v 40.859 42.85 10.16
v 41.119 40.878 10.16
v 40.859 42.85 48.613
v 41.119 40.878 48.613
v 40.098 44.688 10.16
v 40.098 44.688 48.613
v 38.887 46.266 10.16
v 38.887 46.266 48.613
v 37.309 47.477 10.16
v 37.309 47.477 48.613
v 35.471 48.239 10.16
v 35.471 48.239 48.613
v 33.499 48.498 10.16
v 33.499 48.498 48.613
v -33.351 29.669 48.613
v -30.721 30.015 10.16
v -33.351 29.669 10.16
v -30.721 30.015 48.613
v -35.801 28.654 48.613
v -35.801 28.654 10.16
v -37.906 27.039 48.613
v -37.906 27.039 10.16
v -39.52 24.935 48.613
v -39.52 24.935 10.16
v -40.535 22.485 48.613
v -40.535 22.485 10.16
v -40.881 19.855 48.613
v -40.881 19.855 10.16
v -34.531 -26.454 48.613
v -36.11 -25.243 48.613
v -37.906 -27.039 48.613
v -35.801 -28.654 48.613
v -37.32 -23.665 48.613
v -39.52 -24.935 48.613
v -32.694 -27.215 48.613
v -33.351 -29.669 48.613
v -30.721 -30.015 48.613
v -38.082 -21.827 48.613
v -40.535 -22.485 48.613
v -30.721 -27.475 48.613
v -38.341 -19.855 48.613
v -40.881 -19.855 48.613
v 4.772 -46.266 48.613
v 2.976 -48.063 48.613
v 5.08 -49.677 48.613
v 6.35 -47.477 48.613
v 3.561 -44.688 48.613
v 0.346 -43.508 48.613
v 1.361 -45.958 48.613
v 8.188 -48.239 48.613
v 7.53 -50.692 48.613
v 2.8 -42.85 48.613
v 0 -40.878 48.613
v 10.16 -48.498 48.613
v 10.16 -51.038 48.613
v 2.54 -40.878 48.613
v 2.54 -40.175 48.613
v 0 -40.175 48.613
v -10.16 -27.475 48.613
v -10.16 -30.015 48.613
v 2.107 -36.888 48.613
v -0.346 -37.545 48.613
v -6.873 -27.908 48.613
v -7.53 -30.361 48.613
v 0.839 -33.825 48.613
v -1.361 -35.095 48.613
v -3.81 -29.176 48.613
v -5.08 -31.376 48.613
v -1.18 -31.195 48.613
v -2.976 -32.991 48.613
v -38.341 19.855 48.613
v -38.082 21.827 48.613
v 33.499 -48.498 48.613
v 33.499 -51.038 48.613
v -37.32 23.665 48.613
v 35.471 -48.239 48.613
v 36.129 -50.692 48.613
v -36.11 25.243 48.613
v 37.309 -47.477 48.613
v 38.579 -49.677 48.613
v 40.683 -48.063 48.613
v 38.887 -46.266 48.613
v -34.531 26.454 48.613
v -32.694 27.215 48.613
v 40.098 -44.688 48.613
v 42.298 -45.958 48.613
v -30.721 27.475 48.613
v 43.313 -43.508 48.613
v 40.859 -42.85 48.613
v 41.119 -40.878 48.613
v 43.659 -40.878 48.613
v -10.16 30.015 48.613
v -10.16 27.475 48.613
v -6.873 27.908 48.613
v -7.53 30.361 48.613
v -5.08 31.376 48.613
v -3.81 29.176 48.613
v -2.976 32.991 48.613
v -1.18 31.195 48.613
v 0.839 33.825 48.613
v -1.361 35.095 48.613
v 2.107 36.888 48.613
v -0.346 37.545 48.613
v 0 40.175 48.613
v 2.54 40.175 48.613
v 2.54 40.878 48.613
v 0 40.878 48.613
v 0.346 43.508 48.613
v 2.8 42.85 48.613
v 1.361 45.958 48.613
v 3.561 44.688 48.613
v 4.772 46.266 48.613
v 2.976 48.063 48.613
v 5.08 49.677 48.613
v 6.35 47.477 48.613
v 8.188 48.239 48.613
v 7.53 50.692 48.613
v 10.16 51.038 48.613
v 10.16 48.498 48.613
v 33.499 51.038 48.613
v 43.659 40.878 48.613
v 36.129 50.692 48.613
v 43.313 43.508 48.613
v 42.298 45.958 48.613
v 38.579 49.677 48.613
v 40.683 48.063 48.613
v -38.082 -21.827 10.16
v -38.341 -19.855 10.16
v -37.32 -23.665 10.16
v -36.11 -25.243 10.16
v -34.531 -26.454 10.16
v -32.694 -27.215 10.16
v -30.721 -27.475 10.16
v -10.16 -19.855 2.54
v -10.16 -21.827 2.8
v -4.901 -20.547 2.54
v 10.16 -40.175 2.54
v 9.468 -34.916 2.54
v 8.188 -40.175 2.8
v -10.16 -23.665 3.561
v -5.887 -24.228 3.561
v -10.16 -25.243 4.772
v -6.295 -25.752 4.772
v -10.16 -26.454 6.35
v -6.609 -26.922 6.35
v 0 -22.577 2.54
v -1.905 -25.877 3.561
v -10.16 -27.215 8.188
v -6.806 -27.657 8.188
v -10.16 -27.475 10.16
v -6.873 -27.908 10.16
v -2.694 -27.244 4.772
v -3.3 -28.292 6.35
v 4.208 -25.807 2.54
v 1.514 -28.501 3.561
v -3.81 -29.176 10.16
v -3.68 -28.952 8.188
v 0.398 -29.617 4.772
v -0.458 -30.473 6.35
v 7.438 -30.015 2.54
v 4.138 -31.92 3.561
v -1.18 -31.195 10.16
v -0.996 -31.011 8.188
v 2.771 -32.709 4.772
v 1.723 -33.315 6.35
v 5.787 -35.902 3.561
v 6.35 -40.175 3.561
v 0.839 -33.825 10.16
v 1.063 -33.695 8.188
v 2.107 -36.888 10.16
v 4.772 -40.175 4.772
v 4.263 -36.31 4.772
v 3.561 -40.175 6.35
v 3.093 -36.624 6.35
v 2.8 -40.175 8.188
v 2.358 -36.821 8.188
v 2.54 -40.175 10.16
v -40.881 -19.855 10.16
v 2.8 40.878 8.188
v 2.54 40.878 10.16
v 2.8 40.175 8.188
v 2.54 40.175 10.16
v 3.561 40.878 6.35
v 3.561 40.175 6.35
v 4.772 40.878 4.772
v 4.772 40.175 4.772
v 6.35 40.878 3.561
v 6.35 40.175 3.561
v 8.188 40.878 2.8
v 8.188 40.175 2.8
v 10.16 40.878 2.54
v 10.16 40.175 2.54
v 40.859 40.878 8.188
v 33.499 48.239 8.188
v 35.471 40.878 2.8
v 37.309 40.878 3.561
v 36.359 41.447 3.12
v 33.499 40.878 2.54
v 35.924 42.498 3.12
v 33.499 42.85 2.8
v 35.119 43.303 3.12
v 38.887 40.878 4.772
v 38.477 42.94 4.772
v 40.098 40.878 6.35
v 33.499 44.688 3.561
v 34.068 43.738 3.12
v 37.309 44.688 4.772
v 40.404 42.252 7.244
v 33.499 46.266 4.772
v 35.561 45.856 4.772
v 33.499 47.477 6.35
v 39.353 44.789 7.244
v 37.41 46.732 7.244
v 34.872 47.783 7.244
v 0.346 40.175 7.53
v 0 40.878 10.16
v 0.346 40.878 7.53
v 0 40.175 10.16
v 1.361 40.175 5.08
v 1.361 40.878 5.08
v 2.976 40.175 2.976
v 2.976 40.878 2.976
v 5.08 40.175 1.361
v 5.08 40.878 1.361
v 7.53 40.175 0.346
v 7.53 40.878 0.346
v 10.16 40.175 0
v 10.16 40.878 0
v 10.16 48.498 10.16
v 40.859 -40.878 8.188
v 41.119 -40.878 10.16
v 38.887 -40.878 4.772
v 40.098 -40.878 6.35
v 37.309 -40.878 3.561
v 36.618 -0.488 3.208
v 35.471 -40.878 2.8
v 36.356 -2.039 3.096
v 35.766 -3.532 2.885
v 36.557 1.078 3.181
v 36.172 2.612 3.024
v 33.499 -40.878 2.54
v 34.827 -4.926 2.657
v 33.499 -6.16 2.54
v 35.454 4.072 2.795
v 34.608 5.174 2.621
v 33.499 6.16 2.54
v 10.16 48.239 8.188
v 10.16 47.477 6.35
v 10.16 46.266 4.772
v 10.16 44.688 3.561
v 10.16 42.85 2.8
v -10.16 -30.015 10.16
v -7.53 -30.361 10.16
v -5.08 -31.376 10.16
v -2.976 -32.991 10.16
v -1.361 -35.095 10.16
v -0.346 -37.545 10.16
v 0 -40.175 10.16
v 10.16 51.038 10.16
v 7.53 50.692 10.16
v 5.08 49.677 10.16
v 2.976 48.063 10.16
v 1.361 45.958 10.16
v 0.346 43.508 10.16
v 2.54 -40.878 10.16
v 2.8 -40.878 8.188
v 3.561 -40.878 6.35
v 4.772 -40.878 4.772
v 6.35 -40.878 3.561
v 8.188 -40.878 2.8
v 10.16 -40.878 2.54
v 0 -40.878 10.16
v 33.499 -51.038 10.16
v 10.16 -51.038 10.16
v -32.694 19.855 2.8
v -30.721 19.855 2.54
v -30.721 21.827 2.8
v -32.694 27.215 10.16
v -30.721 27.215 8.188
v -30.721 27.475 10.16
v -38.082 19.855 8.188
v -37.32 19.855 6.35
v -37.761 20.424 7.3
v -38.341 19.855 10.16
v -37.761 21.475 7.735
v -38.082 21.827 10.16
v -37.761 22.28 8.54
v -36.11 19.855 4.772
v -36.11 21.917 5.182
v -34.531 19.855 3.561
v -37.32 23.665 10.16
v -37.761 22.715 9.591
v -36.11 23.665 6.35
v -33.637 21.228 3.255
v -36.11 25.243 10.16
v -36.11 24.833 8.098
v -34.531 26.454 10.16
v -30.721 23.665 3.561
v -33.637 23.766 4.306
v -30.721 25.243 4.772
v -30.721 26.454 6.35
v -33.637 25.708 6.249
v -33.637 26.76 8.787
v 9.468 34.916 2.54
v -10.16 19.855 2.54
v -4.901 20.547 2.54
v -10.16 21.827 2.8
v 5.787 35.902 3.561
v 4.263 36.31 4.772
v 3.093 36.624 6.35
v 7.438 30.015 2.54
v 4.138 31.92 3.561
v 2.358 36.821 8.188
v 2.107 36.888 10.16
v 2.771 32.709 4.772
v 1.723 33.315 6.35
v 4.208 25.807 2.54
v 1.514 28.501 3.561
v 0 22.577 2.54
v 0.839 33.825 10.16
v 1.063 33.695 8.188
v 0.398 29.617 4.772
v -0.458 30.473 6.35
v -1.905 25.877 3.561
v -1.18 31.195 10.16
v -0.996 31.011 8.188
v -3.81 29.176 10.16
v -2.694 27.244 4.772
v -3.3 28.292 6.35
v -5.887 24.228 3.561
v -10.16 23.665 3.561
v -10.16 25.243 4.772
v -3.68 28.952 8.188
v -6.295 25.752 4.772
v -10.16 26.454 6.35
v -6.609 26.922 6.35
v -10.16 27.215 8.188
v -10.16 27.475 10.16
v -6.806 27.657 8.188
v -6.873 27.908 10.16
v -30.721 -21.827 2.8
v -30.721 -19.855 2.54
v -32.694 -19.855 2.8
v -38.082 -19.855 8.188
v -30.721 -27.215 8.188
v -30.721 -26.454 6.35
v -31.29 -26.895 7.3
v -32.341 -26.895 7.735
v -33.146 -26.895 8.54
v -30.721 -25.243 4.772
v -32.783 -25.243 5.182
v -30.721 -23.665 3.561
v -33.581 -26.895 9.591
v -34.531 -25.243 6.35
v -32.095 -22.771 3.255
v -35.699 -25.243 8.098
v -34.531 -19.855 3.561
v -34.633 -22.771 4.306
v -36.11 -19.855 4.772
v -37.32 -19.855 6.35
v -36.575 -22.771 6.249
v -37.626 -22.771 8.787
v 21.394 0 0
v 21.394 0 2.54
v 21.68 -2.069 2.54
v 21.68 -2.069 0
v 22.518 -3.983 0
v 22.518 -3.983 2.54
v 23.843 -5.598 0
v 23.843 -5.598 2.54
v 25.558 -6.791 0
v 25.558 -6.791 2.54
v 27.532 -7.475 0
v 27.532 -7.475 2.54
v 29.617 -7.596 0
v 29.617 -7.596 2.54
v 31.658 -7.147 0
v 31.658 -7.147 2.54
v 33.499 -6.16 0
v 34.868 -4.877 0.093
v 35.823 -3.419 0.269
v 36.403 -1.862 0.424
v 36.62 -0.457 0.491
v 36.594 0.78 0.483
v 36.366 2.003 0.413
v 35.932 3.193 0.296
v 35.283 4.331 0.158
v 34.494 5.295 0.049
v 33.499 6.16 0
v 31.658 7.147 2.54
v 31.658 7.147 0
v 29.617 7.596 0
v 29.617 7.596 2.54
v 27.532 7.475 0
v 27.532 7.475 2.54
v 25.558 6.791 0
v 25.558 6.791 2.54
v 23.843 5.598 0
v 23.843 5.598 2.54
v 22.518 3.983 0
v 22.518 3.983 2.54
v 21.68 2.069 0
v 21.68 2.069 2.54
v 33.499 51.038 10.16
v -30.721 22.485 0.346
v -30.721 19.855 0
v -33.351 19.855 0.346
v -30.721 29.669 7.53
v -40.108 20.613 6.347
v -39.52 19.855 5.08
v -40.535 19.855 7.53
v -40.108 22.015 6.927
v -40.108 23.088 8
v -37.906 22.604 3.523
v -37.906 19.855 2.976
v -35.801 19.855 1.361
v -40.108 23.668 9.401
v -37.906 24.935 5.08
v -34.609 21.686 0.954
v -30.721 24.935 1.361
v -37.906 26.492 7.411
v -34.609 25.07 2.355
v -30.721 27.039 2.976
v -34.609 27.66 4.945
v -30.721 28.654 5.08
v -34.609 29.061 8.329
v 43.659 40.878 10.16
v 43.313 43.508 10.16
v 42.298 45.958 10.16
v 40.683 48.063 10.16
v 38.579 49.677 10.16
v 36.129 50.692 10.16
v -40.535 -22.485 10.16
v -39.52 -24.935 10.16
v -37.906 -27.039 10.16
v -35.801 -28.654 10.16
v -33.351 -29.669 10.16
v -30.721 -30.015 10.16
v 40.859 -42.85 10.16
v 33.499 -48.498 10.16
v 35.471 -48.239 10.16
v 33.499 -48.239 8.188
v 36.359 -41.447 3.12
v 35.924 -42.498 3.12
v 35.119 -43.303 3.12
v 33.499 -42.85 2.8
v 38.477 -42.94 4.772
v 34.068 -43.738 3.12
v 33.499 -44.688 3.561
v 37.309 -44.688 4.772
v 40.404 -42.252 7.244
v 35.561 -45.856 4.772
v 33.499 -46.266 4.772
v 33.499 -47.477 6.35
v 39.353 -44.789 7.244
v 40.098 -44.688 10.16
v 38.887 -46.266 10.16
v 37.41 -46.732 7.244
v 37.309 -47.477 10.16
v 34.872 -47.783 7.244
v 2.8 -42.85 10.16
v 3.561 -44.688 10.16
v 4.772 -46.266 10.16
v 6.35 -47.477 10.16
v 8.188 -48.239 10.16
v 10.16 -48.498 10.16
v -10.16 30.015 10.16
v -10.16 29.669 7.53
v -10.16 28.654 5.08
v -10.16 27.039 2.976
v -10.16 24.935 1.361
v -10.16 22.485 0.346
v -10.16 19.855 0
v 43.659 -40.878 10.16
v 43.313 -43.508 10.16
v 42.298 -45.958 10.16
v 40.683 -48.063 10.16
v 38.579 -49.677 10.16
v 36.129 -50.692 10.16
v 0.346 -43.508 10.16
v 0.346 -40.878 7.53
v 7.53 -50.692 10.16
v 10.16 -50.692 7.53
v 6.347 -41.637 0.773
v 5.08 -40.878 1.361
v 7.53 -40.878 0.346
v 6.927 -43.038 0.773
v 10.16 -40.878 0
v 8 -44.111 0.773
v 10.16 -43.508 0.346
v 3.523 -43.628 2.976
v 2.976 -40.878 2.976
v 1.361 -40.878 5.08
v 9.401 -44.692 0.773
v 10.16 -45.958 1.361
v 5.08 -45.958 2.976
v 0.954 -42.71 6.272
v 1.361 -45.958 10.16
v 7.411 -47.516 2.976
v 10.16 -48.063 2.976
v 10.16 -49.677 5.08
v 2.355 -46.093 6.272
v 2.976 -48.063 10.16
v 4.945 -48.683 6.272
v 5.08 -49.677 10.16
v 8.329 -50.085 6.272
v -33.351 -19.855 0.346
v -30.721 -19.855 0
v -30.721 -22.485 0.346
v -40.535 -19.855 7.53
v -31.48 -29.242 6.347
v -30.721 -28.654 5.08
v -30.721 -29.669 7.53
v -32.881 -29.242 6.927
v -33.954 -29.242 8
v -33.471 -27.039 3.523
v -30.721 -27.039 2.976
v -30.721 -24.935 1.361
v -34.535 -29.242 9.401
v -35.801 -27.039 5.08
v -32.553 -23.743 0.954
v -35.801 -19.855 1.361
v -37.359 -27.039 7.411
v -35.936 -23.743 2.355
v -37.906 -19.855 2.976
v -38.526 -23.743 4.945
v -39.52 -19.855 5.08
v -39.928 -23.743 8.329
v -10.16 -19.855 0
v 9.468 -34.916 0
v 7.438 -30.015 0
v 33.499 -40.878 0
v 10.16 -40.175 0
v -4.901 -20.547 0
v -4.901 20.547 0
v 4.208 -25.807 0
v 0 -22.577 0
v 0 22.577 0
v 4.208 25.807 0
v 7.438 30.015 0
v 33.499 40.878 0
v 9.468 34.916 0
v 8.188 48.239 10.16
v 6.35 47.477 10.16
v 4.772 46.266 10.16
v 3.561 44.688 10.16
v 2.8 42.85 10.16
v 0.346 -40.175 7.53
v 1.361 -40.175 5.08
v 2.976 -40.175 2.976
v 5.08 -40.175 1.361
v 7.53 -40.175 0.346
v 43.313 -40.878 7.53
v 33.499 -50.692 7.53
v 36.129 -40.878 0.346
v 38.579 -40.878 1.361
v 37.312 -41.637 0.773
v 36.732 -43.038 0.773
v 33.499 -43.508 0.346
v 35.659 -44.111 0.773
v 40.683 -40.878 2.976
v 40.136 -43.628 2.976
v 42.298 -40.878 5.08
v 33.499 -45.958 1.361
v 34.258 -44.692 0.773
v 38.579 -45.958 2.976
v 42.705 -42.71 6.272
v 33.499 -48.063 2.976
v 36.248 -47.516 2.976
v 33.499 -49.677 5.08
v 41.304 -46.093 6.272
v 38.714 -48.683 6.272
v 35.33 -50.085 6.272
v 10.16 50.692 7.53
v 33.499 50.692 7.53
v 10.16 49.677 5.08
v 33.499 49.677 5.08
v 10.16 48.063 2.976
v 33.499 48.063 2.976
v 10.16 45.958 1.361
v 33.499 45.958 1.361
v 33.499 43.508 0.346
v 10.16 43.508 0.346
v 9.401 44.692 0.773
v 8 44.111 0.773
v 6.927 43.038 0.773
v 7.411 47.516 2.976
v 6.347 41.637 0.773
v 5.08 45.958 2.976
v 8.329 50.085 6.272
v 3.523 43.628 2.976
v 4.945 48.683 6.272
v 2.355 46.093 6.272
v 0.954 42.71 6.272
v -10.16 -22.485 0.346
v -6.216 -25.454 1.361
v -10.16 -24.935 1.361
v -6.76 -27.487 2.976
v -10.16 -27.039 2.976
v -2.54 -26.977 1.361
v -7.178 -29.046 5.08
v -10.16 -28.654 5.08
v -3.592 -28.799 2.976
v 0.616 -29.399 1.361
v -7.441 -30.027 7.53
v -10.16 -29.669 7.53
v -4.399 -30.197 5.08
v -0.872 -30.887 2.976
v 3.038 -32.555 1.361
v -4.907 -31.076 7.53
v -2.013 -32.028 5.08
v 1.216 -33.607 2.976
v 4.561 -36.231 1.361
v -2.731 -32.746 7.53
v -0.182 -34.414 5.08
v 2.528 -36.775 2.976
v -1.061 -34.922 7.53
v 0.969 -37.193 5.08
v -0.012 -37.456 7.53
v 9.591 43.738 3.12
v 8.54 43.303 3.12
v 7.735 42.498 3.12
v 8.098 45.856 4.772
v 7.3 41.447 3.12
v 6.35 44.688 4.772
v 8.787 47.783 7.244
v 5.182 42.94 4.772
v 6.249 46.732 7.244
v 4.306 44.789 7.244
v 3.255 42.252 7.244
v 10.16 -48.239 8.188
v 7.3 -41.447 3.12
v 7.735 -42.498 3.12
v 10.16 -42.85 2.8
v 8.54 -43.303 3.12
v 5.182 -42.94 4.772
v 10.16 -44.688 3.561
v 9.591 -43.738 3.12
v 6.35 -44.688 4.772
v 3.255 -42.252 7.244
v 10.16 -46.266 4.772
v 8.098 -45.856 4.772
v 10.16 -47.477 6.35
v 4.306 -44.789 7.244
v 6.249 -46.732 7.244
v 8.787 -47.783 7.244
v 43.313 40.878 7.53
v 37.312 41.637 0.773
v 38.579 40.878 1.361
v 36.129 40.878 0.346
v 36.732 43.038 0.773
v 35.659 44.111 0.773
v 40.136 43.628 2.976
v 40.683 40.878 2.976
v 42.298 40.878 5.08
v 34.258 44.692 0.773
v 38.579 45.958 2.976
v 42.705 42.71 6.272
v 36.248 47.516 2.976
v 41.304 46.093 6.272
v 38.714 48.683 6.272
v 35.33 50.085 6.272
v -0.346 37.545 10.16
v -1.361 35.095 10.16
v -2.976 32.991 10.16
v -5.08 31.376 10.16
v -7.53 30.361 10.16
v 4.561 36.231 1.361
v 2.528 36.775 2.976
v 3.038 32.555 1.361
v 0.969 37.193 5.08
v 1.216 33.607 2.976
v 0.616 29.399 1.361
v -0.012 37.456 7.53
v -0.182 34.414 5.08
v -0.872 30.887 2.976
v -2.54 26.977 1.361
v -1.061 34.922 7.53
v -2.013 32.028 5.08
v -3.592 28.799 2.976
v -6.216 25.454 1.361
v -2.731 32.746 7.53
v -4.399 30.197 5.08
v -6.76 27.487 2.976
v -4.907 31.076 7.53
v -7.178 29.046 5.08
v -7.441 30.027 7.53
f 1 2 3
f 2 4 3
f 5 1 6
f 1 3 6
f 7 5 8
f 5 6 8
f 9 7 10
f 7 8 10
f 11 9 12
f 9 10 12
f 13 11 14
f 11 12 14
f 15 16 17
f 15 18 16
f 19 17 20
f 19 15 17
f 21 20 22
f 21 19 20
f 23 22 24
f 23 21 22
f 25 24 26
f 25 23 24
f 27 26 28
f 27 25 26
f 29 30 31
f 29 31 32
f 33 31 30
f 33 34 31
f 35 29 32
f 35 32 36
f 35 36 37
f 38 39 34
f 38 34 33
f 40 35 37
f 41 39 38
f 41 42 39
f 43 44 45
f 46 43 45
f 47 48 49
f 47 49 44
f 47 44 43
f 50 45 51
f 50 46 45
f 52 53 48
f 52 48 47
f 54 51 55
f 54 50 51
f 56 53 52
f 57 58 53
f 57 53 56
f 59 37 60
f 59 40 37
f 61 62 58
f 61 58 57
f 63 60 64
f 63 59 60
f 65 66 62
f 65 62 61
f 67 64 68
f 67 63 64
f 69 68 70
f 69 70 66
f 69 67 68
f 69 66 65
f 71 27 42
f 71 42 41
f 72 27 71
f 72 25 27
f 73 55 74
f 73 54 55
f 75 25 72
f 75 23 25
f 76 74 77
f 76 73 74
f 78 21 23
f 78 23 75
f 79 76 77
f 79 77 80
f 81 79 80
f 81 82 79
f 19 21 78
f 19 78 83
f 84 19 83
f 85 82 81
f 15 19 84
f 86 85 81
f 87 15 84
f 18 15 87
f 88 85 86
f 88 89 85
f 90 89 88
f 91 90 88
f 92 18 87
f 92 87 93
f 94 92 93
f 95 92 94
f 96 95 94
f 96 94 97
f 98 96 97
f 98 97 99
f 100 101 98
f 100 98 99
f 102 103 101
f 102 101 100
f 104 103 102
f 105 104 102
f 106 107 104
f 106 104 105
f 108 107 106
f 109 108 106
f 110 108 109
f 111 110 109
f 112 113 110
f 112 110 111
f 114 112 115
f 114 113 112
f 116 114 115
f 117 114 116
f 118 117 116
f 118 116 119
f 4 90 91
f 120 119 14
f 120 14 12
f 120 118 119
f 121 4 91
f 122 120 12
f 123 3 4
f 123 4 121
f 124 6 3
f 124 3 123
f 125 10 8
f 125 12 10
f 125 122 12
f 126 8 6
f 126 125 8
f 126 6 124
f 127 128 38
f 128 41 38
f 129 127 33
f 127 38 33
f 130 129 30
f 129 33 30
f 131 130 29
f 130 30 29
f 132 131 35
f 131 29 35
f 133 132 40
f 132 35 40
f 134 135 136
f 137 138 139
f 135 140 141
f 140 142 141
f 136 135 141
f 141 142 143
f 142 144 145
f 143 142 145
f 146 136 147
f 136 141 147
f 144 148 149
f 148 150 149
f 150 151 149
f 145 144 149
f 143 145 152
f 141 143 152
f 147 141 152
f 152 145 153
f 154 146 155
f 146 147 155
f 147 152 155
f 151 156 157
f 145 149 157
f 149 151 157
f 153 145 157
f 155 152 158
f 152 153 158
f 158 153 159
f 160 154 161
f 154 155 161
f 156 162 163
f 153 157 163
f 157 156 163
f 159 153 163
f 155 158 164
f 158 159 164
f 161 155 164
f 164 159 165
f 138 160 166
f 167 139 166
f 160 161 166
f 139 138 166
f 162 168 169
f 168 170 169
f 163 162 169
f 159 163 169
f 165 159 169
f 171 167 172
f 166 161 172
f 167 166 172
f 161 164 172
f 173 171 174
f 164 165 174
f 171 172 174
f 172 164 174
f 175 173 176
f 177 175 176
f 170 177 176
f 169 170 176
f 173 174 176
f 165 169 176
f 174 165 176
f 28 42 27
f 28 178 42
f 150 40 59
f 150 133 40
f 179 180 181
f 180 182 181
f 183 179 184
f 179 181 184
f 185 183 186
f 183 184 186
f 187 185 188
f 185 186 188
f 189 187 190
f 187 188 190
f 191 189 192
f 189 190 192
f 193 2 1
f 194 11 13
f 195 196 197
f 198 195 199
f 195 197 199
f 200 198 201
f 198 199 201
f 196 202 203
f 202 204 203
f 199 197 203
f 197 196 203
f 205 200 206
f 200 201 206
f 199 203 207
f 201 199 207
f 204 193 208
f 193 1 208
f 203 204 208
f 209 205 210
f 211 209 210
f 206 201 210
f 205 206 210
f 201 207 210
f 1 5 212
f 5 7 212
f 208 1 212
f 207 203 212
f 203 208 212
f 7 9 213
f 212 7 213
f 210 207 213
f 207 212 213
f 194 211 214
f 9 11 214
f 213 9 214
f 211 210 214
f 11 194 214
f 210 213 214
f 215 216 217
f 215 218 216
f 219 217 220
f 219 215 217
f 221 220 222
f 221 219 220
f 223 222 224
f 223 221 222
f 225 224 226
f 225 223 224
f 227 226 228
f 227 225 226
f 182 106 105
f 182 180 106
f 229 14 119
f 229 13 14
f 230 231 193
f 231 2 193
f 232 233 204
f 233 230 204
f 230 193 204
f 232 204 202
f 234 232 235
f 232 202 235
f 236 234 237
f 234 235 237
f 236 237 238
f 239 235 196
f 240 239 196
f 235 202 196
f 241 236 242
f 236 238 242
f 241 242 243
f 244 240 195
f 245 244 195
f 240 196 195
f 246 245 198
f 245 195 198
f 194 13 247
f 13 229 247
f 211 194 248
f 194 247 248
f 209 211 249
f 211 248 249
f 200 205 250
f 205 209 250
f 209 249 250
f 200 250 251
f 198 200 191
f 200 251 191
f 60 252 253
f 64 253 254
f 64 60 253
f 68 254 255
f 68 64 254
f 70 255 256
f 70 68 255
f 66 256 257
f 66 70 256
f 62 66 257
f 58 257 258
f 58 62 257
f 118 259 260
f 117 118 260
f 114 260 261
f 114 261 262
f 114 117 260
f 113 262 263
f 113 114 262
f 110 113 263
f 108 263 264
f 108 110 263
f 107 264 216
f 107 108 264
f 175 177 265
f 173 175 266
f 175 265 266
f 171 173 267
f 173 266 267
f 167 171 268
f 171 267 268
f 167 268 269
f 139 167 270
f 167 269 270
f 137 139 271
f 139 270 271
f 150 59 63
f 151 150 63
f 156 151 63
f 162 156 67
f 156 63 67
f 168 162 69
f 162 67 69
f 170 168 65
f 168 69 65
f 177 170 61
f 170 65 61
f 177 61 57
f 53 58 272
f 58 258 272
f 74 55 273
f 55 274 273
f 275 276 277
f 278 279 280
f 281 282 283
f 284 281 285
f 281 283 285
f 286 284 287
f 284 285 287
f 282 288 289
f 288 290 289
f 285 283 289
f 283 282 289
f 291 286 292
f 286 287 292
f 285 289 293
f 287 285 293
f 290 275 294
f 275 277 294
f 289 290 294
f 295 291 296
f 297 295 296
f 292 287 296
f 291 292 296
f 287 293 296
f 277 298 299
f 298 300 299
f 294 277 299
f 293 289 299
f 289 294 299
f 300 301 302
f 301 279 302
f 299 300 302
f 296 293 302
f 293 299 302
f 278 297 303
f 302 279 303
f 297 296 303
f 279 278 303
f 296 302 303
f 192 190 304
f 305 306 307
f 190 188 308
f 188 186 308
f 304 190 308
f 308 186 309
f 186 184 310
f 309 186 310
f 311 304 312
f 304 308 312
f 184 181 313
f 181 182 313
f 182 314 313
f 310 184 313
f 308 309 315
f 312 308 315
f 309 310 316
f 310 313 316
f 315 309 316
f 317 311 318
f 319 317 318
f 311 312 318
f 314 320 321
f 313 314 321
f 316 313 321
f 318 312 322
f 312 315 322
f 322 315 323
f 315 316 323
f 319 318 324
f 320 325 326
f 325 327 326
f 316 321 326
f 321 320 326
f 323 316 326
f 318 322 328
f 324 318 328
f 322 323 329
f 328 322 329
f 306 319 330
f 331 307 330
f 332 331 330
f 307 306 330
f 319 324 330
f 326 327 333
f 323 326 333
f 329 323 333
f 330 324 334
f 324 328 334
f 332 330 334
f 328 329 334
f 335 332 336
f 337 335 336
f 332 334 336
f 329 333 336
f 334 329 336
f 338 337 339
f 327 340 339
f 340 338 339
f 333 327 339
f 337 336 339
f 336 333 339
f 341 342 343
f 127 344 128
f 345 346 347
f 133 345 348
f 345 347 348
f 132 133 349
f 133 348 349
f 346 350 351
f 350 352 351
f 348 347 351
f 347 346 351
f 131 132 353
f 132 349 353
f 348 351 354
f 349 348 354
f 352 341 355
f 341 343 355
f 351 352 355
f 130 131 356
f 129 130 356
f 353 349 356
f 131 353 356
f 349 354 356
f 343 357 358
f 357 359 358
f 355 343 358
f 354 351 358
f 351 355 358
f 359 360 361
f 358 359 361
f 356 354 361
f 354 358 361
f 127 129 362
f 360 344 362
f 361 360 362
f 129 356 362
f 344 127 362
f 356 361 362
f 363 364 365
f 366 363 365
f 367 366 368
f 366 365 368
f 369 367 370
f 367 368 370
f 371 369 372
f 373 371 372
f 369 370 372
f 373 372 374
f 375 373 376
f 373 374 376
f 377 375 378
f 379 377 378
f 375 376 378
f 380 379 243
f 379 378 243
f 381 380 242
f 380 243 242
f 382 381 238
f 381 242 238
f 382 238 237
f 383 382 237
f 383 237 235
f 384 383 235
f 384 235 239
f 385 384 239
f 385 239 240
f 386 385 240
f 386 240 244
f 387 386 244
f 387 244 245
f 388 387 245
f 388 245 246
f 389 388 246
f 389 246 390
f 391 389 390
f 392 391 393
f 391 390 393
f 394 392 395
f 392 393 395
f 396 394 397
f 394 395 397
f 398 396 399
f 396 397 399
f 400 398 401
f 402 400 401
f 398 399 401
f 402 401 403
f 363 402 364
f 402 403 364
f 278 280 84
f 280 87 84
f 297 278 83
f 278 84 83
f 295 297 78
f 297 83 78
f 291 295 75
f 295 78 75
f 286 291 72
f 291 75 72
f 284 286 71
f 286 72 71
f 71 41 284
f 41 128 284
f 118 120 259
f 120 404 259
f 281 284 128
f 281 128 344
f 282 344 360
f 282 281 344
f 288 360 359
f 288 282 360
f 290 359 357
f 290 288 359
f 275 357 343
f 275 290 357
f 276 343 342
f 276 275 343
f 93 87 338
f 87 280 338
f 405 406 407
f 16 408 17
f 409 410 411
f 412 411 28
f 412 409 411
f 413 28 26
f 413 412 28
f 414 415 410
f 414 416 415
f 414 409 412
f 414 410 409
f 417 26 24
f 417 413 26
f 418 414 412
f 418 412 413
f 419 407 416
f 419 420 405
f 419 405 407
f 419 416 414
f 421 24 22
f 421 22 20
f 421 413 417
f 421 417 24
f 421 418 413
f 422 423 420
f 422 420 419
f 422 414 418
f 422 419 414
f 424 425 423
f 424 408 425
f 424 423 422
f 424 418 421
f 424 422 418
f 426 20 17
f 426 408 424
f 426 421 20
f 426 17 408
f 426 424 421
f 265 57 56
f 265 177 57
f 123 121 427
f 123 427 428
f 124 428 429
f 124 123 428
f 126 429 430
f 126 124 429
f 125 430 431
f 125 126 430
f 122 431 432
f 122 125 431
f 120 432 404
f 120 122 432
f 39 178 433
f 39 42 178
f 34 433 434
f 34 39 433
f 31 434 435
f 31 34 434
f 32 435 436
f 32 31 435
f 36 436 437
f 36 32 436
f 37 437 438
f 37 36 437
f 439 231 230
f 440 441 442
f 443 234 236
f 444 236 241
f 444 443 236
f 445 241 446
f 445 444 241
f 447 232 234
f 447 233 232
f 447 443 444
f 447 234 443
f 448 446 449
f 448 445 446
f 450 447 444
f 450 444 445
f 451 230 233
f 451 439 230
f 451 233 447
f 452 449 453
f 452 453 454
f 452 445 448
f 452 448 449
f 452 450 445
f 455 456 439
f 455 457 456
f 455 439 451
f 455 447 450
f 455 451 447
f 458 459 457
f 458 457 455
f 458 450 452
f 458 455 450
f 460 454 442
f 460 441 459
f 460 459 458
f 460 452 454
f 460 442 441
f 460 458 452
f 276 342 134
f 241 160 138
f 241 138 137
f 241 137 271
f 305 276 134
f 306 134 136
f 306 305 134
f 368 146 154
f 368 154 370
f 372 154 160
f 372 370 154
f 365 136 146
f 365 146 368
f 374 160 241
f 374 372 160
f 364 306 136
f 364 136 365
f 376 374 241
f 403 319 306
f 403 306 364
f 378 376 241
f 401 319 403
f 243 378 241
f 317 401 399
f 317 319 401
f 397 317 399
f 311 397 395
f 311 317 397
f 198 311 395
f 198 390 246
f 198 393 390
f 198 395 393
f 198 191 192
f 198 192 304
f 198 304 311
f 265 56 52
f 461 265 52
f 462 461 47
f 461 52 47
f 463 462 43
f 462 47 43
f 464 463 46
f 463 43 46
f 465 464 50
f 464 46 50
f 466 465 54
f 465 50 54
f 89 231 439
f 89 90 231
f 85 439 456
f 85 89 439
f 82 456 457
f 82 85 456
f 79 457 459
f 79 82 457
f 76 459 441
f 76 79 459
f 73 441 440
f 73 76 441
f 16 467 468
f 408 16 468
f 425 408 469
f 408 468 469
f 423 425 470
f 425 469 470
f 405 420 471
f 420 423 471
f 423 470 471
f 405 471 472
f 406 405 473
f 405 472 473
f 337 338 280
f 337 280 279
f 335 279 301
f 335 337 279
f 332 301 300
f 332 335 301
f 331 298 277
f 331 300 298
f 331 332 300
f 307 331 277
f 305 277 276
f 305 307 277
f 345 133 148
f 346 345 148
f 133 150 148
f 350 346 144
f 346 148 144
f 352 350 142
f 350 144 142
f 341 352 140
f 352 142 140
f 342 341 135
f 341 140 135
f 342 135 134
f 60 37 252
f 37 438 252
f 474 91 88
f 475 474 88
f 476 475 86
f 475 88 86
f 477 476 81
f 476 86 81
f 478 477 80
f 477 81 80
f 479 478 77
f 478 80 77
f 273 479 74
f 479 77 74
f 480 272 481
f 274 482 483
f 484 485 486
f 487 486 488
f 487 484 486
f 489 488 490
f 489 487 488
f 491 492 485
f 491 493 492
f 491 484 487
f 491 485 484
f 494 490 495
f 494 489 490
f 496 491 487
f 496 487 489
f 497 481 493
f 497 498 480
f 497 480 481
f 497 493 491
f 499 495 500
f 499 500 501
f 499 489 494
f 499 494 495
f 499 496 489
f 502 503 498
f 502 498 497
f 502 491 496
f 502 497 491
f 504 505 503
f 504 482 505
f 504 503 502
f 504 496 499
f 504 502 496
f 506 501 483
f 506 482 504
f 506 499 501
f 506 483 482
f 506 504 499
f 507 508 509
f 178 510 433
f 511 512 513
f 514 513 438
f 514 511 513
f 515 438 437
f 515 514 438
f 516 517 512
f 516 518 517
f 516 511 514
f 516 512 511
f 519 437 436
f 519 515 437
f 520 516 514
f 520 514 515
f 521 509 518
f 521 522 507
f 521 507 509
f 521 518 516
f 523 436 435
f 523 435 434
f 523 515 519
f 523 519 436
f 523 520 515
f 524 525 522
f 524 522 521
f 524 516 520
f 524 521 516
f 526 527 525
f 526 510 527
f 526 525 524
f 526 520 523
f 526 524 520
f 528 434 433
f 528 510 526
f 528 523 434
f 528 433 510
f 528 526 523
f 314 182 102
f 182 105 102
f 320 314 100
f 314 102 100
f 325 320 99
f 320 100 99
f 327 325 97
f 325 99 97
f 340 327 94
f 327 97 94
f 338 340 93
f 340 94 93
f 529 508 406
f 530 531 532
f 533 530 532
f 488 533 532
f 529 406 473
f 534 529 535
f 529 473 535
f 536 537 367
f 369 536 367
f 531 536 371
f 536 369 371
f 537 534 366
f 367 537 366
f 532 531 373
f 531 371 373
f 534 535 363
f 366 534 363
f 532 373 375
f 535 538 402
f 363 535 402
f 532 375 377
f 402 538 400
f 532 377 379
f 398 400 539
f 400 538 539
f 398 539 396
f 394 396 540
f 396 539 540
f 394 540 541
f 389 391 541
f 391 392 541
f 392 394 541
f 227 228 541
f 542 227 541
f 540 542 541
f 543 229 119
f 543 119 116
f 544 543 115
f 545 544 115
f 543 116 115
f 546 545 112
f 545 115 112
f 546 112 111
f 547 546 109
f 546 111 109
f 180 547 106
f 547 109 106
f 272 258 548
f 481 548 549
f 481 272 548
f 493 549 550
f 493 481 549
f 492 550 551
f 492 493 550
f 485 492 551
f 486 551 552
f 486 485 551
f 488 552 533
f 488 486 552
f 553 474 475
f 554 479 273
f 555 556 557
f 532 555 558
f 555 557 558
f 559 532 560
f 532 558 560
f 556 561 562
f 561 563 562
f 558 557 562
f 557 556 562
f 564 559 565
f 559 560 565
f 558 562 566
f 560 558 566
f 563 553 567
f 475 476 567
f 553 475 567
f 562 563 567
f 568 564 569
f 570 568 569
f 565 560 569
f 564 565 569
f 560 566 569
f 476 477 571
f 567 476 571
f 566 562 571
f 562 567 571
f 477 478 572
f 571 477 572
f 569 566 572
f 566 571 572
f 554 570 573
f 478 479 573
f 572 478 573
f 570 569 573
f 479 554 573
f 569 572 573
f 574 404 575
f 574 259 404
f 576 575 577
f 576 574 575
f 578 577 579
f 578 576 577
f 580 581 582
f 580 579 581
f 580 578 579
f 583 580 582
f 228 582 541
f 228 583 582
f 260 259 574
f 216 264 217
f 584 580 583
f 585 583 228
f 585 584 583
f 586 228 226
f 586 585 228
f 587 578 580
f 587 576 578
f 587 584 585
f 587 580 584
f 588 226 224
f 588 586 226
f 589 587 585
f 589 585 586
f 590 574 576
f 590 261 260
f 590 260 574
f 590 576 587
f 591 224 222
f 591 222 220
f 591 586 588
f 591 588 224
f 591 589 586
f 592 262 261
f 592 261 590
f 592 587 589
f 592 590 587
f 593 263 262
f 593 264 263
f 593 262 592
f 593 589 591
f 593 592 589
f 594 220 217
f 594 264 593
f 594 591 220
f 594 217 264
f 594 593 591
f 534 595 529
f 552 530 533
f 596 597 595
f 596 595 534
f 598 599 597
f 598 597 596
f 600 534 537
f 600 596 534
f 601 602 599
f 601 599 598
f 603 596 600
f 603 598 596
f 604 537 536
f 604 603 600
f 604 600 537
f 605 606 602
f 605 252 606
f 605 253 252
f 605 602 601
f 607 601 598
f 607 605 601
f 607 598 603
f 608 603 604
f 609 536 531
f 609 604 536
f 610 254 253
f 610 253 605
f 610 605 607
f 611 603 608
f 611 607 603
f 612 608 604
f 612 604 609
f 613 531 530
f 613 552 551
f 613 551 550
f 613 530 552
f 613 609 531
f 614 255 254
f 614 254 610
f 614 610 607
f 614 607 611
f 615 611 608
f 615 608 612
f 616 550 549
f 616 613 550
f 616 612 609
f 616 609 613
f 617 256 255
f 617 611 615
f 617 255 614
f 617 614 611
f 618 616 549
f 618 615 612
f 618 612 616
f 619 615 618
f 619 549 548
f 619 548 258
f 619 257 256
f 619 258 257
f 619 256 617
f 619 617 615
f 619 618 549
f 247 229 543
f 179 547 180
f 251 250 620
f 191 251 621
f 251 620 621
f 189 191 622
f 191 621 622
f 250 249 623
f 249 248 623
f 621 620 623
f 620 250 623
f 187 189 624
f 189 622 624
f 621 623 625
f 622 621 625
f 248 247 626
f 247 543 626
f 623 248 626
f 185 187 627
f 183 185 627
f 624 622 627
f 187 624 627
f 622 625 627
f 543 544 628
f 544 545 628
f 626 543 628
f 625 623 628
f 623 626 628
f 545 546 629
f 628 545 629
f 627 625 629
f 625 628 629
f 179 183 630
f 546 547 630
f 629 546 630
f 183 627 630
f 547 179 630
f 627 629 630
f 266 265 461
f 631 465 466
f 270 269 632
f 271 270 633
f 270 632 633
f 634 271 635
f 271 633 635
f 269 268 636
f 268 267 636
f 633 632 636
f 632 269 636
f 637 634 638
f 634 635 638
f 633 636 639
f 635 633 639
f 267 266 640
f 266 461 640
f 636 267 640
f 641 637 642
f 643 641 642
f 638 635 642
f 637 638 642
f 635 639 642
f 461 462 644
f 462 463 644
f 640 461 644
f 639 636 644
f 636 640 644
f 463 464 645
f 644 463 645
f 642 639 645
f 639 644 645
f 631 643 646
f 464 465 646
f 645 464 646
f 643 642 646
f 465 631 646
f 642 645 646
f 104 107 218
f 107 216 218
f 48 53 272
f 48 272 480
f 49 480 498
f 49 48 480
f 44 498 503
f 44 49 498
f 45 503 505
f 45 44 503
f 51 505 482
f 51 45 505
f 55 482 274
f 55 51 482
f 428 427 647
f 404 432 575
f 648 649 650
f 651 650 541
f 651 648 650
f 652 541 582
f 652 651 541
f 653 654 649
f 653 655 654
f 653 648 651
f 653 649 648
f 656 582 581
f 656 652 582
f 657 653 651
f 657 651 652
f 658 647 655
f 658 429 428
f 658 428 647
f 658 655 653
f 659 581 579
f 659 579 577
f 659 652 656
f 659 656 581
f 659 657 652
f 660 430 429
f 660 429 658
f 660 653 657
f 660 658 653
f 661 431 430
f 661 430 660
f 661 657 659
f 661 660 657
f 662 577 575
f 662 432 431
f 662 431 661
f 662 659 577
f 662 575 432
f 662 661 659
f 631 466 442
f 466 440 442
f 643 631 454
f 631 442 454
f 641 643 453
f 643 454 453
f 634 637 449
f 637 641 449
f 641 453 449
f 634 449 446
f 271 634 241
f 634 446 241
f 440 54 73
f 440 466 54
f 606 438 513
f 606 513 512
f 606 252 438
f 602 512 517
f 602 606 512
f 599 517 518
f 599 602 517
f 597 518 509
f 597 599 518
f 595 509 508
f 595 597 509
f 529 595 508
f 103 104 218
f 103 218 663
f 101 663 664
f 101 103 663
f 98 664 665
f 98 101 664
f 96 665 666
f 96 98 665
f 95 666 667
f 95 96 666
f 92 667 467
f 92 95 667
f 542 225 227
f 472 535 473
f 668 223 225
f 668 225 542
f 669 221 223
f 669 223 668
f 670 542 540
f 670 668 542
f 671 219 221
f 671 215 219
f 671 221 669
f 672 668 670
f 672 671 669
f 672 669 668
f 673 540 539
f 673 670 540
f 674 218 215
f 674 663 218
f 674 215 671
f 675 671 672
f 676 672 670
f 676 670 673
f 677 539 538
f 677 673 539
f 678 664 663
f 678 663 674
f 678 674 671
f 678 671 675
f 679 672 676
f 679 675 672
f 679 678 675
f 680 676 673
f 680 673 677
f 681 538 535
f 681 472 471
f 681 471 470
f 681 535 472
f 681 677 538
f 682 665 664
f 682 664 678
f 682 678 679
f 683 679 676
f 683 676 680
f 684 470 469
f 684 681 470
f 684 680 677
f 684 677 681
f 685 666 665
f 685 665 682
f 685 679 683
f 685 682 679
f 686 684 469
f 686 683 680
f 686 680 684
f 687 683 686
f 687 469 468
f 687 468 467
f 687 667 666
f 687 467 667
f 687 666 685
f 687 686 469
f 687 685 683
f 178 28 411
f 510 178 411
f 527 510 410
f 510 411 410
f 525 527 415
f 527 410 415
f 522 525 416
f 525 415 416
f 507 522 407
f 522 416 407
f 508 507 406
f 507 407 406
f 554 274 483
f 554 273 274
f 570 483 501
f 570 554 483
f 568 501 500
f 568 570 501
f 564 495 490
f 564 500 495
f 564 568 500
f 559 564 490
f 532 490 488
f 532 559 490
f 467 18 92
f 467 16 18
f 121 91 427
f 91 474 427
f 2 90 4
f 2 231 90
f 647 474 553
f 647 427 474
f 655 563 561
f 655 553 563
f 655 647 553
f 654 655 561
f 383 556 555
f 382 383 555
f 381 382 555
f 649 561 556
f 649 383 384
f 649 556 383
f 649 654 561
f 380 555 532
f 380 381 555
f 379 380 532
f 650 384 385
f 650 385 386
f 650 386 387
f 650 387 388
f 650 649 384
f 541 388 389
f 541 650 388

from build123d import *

# Parameters (mm, degrees)
F0_W     = 40.881359
F0_H     = 60.0299
F1_DEPTH = 48.612542
F2_R     = 10.16
F3_T     = -2.54
F5_D     = 15.24


with BuildPart() as f1:
    # F0 (on Top) → F1 (new body)
    with BuildSketch(Plane.XY):
        Polygon((43.658987, 51.038296), (0, 51.038296), (0, 30.01495), (0, -30.01495), (0, -51.038296), (43.658987, -51.038296), align=None)
        with Locations((-20.440679, 0)):
            Rectangle(F0_W, F0_H)
    extrude(amount=F1_DEPTH)

    # F2
    f2_edges = [f1.edges().sort_by_distance(p)[0] for p in [
        (0, 51.038296, 24.306271),
        (43.658987, -51.038296, 24.306271),
        (43.658987, 51.038296, 24.306271),
        (0, -51.038296, 24.306271),
        (43.658987, 0, 0),
        (21.829493, 51.038296, 0),
        (0, 40.526623, 0),
        (-20.44068, 30.01495, 0),
        (-40.881359, 0, 0),
        (-20.44068, -30.01495, 0),
        (0, -40.526623, 0),
        (21.829493, -51.038296, 0),
        (0, 30.01495, 24.306271),
        (-40.881359, 30.01495, 24.306271),
        (-40.881359, -30.01495, 24.306271),
        (0, -30.01495, 24.306271),
    ]]
    fillet(f2_edges, radius=F2_R)

    # F3
    f3_openings = [f1.faces().sort_by_distance(p)[0] for p in [
        (6.859627, 0, 48.612542),
    ]]
    offset(amount=F3_T, openings=f3_openings)

    # F5 (through all)
    with Locations(Plane(origin=(0, 0, 0), x_dir=(1, 0, 0), z_dir=(0, 0, -1))):
        with Locations((29.013653, 0)):
            Hole(F5_D / 2)


solid = f1.part
